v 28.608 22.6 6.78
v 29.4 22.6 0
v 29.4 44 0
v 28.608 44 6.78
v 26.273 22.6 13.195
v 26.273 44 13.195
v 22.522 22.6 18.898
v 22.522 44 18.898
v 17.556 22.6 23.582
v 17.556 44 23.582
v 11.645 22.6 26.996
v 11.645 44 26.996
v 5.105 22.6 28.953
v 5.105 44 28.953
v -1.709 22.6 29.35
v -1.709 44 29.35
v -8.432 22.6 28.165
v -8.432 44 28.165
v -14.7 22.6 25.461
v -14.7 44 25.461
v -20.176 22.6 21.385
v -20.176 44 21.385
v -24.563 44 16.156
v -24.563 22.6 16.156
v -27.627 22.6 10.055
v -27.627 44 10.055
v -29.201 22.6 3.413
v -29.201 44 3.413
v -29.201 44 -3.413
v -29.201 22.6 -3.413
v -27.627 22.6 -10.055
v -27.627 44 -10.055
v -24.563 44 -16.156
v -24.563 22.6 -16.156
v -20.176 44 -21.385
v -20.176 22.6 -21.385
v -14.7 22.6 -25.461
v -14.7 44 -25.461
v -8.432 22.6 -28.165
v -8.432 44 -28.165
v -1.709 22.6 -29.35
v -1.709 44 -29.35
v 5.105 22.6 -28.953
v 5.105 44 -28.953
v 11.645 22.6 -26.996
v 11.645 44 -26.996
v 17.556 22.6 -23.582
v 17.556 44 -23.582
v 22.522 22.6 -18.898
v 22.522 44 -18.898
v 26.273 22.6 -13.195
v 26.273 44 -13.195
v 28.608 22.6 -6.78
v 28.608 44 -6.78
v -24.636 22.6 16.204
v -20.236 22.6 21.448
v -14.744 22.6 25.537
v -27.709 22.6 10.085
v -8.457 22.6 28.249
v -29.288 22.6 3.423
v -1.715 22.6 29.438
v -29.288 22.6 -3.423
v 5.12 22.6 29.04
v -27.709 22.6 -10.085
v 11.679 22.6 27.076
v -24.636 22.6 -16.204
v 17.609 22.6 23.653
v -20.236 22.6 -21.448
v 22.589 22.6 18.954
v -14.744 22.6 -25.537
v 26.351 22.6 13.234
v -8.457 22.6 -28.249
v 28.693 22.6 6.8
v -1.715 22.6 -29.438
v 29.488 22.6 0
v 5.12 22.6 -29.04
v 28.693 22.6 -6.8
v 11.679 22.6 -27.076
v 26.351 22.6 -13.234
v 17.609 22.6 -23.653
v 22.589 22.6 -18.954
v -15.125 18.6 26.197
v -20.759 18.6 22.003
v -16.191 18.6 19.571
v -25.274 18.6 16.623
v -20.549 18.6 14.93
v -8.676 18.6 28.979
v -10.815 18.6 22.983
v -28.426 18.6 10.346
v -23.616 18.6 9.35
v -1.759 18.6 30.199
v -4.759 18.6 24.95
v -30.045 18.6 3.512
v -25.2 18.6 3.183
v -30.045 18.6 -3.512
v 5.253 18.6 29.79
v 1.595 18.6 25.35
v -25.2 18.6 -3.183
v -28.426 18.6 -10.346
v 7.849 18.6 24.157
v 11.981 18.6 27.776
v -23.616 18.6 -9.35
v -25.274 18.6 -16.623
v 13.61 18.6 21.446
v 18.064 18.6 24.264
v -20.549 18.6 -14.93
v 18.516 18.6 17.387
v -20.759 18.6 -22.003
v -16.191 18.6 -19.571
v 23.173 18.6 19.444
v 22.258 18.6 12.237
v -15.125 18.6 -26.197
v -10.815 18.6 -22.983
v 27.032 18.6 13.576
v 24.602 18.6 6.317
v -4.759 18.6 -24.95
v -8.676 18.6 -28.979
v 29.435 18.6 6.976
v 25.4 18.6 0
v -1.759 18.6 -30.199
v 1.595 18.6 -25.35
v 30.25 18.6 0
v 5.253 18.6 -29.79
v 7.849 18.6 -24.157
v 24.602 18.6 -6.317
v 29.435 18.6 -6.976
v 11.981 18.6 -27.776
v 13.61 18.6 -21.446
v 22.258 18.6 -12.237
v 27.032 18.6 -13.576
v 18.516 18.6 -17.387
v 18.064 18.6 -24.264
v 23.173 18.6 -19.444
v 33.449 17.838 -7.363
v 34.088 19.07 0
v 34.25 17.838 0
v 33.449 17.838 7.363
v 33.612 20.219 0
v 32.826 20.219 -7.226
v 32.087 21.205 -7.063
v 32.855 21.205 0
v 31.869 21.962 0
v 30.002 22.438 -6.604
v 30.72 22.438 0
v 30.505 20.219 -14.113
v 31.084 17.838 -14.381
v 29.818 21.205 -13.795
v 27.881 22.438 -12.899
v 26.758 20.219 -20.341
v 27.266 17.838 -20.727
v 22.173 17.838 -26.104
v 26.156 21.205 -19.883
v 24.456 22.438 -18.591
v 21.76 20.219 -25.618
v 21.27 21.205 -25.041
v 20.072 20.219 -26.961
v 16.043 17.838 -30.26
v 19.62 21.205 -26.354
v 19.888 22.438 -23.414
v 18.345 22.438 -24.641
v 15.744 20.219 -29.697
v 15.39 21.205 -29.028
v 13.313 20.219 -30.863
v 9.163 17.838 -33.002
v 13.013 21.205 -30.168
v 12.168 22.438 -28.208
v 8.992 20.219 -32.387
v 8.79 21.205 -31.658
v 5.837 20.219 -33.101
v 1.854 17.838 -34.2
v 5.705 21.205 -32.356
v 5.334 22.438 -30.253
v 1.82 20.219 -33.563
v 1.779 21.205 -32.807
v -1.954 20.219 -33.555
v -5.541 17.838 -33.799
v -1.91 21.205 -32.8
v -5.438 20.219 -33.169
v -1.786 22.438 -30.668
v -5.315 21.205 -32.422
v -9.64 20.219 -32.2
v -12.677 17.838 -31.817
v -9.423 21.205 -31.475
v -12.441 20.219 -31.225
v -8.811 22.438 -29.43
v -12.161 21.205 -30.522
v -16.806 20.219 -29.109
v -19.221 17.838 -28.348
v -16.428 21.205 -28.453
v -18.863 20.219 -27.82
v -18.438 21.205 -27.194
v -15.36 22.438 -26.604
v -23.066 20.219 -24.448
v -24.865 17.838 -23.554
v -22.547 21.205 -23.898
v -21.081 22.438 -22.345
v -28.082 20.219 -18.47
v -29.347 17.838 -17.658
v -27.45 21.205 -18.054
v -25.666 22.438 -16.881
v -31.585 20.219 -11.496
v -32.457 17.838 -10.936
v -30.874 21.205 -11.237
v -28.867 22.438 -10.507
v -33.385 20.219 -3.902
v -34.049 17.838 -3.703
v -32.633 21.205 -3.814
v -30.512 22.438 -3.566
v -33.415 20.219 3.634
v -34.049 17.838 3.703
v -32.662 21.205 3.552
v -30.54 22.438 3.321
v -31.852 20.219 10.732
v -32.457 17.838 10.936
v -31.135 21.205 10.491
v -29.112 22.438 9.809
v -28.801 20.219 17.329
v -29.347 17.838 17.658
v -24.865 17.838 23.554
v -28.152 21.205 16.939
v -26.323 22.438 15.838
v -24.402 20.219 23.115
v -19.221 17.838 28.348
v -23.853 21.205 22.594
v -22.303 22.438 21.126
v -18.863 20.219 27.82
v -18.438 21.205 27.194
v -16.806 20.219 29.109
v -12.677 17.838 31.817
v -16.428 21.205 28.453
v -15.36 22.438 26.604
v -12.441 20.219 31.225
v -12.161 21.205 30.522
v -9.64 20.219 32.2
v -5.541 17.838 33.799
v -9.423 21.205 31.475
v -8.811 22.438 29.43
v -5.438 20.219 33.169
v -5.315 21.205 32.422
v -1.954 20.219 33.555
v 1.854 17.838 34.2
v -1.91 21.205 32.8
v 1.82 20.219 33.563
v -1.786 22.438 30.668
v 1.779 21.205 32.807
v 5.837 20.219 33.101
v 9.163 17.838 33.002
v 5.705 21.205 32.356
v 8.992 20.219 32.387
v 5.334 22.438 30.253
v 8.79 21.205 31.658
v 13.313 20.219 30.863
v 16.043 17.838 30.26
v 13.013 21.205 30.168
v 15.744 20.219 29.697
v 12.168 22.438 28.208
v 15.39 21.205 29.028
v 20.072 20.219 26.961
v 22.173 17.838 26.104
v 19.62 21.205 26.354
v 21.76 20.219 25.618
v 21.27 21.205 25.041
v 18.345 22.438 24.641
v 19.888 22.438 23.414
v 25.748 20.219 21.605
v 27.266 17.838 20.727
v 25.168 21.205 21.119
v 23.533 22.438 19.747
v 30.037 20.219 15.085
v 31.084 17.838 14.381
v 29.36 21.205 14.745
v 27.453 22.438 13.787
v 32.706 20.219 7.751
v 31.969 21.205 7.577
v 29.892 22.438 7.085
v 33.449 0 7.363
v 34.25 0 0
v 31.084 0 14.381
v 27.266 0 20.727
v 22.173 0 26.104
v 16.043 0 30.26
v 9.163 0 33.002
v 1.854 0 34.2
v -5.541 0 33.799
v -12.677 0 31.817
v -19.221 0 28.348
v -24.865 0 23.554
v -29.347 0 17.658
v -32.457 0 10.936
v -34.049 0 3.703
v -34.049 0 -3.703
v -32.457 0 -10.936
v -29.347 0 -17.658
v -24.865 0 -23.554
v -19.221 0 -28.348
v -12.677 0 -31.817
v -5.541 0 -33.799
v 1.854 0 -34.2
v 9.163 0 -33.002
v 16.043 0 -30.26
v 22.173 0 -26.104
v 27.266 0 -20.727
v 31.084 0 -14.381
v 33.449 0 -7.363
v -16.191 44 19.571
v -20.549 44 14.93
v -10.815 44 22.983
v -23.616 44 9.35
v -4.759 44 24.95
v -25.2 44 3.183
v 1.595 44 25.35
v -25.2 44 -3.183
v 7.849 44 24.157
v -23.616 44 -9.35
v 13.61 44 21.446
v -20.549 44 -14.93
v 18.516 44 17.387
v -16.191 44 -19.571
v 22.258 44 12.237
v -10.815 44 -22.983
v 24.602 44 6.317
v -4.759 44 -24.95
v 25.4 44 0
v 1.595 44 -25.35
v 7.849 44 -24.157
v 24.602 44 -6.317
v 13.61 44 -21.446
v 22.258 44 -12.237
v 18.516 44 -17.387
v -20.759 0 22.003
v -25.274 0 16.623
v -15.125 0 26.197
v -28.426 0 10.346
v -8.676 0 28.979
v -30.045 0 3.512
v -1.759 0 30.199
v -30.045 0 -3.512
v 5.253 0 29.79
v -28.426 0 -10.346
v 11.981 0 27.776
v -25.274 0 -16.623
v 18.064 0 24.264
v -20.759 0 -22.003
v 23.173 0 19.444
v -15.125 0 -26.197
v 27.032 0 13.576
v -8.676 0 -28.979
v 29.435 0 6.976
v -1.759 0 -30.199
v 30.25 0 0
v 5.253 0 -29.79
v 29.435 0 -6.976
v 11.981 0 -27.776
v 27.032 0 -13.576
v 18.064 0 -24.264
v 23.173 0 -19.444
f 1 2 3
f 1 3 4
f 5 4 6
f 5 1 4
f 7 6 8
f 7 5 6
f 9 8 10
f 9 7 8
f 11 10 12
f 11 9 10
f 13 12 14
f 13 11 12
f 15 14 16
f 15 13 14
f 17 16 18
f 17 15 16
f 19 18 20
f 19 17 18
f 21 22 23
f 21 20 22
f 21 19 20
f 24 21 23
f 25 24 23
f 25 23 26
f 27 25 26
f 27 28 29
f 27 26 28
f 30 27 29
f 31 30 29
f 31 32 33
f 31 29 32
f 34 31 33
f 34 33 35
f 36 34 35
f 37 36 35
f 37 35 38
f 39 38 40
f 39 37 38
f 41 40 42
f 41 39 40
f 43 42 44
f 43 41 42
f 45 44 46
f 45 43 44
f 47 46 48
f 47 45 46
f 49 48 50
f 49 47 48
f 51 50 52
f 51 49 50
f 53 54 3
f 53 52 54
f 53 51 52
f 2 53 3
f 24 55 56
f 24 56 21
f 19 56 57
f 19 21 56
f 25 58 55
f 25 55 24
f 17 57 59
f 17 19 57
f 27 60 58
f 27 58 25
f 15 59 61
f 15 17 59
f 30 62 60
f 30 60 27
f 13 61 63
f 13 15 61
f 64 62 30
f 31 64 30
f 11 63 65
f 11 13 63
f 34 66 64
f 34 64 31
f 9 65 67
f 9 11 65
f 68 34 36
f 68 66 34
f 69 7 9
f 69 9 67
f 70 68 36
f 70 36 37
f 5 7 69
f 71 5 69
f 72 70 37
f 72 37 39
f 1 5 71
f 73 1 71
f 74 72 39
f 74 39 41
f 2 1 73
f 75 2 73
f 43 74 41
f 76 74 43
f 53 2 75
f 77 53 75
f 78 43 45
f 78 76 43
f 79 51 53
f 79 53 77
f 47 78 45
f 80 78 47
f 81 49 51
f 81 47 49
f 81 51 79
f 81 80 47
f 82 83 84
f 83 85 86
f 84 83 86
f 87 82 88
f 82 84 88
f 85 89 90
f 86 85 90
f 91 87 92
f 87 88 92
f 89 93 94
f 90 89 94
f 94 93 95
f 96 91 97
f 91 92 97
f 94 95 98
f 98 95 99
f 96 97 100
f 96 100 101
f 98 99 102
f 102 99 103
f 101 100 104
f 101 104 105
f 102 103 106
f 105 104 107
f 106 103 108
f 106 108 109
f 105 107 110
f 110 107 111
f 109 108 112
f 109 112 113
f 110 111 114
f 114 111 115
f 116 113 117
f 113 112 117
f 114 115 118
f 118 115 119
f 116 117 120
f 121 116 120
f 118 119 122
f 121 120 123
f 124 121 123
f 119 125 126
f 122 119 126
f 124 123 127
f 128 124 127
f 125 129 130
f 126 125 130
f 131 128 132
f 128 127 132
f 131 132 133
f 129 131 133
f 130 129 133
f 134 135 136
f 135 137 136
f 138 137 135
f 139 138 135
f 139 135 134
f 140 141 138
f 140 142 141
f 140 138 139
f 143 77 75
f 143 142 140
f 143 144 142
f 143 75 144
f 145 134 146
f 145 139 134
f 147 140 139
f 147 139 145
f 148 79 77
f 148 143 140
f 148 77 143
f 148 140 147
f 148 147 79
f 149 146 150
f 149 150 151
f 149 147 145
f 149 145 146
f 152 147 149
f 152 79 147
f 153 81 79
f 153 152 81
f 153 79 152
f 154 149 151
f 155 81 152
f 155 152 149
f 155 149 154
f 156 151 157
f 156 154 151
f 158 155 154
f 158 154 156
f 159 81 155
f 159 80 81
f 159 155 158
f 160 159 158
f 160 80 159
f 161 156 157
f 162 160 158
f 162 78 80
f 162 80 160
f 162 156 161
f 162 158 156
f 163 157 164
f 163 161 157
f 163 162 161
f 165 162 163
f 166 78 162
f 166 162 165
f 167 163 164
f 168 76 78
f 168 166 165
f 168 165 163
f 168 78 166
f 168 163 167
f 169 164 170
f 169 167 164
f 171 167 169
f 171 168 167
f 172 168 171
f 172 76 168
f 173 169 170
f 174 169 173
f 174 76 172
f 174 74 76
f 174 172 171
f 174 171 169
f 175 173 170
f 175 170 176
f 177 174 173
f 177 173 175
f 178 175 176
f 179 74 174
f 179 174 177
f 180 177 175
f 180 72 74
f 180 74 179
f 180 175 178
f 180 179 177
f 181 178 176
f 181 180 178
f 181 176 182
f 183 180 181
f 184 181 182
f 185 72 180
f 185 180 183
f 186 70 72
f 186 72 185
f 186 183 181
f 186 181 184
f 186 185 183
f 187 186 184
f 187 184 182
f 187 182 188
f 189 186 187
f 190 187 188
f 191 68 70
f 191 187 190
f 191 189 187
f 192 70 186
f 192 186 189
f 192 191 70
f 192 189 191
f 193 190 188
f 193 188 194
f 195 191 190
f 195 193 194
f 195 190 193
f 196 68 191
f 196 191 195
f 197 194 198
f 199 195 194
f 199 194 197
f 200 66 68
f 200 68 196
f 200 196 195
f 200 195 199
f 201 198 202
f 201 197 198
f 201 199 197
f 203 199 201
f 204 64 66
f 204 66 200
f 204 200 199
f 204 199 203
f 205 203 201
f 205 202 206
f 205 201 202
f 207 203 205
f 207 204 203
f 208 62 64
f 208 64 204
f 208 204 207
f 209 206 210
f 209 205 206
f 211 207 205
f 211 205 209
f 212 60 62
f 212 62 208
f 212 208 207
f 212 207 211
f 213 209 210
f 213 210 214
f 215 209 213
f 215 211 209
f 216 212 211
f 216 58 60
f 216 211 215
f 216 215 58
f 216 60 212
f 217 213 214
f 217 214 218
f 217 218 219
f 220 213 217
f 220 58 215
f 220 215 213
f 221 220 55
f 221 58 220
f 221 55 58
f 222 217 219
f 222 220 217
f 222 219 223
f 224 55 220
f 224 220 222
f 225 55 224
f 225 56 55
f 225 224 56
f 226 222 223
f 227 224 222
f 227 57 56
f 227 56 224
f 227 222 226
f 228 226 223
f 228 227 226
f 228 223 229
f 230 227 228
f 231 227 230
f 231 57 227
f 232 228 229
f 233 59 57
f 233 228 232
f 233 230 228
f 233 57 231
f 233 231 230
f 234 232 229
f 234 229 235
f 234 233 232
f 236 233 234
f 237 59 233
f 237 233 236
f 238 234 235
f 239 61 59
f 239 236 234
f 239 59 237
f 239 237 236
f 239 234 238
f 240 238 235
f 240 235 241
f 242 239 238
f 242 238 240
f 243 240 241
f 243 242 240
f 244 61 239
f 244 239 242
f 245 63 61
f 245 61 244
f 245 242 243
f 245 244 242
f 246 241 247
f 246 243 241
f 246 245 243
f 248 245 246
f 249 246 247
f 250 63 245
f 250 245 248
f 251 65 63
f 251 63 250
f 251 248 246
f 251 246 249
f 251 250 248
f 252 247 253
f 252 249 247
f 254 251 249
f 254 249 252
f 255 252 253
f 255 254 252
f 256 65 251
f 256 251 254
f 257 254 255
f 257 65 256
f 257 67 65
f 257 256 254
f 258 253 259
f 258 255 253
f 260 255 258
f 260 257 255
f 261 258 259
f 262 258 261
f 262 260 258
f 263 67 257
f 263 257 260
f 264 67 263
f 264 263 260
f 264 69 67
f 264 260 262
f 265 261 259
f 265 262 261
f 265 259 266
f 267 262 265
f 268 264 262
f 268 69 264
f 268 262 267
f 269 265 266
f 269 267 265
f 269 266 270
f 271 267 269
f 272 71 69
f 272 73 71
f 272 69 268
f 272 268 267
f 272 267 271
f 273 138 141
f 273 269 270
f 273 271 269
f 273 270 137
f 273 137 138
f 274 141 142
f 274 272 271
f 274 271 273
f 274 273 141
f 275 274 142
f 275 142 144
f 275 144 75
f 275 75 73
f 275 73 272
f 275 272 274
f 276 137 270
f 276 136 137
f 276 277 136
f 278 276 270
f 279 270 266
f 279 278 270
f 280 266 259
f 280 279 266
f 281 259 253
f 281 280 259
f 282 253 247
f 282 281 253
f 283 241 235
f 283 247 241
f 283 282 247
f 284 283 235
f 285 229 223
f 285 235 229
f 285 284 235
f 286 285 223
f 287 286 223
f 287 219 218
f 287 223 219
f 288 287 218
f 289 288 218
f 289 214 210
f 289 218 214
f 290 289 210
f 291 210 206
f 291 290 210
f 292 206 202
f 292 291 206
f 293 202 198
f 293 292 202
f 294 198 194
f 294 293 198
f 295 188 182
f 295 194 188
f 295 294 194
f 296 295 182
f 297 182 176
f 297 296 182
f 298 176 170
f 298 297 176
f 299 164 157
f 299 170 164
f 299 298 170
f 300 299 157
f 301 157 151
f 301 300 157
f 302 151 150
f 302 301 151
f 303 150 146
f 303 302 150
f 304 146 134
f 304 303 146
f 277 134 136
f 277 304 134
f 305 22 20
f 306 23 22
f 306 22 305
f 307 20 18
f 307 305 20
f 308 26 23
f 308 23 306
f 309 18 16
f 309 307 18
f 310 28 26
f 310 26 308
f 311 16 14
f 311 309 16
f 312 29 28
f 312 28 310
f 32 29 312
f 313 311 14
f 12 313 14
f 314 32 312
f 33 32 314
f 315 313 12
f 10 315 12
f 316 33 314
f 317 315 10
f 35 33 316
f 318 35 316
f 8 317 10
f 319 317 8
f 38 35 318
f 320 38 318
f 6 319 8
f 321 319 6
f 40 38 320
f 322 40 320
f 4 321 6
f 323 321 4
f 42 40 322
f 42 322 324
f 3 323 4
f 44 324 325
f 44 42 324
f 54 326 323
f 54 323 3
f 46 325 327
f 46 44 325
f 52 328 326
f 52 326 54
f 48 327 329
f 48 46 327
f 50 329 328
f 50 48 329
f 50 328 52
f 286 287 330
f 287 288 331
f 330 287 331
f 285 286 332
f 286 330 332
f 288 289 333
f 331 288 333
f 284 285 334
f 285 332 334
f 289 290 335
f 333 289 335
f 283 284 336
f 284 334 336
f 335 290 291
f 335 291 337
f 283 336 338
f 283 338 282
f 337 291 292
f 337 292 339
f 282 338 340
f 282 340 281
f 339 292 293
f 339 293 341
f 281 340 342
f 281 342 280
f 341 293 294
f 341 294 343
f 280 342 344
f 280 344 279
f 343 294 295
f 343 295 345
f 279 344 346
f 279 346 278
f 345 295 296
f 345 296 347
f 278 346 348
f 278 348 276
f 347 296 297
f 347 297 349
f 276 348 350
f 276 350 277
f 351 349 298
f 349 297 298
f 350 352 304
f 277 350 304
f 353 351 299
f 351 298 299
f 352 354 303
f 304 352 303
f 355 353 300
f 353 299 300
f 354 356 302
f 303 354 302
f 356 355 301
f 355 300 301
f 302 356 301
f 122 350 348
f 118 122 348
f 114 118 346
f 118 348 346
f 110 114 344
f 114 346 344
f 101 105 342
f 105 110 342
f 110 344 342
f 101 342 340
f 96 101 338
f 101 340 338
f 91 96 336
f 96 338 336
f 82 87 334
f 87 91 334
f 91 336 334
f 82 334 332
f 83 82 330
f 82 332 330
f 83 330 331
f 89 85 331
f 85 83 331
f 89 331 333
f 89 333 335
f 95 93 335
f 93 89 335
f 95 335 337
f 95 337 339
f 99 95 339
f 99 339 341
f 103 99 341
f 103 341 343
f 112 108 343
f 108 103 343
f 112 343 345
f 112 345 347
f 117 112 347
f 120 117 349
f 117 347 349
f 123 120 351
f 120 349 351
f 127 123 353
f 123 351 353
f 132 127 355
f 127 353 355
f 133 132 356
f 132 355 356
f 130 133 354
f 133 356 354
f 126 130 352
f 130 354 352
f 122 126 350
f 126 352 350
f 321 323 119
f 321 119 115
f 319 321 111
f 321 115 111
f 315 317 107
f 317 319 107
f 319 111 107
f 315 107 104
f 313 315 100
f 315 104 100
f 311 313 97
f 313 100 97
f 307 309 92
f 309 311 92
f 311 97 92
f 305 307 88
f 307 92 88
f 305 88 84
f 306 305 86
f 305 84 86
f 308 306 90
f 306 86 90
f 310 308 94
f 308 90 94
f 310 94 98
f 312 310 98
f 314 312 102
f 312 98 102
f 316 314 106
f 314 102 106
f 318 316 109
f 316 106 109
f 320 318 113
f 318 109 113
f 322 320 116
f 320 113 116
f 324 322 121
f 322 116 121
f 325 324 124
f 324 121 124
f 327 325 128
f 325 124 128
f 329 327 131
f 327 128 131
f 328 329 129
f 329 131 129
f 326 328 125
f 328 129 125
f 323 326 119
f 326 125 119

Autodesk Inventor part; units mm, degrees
ref_plane "YZ Plane" through (0, 0, 0) normal (1, 0, 0) x (0, 1, 0)
ref_plane "XZ Plane" through (0, 0, 0) normal (0, 1, 0) x (-1, 0, 0)
ref_plane "XY Plane" through (0, 0, 0) normal (0, 0, 1) x (1, 0, 0)
sketch "Sketch1" plane through (0, 0, 0) normal (0, 0, 1) x (1, 0, 0)
  line L0 (0, 0) -> (0, 29.5332)
  line L1 (29.4, 44) -> (29.4, 22.6)
  line L2 (29.4, 22.6) -> (29.4875, 22.6)
  line L3 (34.25, 17.8375) -> (34.25, 0)
  line L4 (34.25, 0) -> (30.25, 0)
  line L5 (25.4, 44) -> (29.4, 44)
  line L6 (25.4, 44) -> (25.4, 18.6)
  line L7 (25.4, 18.6) -> (30.25, 18.6)
  line L8 (30.25, 18.6) -> (30.25, 0)
  arc A0 (34.25, 17.8375) -> (29.4875, 22.6) centre (29.4875, 17.8375) ccw
  dimension "d0" = 25.4
  dimension "d1" = 30.25
  dimension "d2" = 4
  dimension "d3" = 4
  dimension "d4" = 25.4
  dimension "d5" = 44
  dimension "d6" = 0
  dimension "d7" = 4
  dimension "d8" = 4.7625
revolve "Revolution1" add sketch "Sketch1" angle 360 about axis through (0, 0, 0) along (0, 1, 0)
properties part number "Male Adaptor to Water Sensor"
